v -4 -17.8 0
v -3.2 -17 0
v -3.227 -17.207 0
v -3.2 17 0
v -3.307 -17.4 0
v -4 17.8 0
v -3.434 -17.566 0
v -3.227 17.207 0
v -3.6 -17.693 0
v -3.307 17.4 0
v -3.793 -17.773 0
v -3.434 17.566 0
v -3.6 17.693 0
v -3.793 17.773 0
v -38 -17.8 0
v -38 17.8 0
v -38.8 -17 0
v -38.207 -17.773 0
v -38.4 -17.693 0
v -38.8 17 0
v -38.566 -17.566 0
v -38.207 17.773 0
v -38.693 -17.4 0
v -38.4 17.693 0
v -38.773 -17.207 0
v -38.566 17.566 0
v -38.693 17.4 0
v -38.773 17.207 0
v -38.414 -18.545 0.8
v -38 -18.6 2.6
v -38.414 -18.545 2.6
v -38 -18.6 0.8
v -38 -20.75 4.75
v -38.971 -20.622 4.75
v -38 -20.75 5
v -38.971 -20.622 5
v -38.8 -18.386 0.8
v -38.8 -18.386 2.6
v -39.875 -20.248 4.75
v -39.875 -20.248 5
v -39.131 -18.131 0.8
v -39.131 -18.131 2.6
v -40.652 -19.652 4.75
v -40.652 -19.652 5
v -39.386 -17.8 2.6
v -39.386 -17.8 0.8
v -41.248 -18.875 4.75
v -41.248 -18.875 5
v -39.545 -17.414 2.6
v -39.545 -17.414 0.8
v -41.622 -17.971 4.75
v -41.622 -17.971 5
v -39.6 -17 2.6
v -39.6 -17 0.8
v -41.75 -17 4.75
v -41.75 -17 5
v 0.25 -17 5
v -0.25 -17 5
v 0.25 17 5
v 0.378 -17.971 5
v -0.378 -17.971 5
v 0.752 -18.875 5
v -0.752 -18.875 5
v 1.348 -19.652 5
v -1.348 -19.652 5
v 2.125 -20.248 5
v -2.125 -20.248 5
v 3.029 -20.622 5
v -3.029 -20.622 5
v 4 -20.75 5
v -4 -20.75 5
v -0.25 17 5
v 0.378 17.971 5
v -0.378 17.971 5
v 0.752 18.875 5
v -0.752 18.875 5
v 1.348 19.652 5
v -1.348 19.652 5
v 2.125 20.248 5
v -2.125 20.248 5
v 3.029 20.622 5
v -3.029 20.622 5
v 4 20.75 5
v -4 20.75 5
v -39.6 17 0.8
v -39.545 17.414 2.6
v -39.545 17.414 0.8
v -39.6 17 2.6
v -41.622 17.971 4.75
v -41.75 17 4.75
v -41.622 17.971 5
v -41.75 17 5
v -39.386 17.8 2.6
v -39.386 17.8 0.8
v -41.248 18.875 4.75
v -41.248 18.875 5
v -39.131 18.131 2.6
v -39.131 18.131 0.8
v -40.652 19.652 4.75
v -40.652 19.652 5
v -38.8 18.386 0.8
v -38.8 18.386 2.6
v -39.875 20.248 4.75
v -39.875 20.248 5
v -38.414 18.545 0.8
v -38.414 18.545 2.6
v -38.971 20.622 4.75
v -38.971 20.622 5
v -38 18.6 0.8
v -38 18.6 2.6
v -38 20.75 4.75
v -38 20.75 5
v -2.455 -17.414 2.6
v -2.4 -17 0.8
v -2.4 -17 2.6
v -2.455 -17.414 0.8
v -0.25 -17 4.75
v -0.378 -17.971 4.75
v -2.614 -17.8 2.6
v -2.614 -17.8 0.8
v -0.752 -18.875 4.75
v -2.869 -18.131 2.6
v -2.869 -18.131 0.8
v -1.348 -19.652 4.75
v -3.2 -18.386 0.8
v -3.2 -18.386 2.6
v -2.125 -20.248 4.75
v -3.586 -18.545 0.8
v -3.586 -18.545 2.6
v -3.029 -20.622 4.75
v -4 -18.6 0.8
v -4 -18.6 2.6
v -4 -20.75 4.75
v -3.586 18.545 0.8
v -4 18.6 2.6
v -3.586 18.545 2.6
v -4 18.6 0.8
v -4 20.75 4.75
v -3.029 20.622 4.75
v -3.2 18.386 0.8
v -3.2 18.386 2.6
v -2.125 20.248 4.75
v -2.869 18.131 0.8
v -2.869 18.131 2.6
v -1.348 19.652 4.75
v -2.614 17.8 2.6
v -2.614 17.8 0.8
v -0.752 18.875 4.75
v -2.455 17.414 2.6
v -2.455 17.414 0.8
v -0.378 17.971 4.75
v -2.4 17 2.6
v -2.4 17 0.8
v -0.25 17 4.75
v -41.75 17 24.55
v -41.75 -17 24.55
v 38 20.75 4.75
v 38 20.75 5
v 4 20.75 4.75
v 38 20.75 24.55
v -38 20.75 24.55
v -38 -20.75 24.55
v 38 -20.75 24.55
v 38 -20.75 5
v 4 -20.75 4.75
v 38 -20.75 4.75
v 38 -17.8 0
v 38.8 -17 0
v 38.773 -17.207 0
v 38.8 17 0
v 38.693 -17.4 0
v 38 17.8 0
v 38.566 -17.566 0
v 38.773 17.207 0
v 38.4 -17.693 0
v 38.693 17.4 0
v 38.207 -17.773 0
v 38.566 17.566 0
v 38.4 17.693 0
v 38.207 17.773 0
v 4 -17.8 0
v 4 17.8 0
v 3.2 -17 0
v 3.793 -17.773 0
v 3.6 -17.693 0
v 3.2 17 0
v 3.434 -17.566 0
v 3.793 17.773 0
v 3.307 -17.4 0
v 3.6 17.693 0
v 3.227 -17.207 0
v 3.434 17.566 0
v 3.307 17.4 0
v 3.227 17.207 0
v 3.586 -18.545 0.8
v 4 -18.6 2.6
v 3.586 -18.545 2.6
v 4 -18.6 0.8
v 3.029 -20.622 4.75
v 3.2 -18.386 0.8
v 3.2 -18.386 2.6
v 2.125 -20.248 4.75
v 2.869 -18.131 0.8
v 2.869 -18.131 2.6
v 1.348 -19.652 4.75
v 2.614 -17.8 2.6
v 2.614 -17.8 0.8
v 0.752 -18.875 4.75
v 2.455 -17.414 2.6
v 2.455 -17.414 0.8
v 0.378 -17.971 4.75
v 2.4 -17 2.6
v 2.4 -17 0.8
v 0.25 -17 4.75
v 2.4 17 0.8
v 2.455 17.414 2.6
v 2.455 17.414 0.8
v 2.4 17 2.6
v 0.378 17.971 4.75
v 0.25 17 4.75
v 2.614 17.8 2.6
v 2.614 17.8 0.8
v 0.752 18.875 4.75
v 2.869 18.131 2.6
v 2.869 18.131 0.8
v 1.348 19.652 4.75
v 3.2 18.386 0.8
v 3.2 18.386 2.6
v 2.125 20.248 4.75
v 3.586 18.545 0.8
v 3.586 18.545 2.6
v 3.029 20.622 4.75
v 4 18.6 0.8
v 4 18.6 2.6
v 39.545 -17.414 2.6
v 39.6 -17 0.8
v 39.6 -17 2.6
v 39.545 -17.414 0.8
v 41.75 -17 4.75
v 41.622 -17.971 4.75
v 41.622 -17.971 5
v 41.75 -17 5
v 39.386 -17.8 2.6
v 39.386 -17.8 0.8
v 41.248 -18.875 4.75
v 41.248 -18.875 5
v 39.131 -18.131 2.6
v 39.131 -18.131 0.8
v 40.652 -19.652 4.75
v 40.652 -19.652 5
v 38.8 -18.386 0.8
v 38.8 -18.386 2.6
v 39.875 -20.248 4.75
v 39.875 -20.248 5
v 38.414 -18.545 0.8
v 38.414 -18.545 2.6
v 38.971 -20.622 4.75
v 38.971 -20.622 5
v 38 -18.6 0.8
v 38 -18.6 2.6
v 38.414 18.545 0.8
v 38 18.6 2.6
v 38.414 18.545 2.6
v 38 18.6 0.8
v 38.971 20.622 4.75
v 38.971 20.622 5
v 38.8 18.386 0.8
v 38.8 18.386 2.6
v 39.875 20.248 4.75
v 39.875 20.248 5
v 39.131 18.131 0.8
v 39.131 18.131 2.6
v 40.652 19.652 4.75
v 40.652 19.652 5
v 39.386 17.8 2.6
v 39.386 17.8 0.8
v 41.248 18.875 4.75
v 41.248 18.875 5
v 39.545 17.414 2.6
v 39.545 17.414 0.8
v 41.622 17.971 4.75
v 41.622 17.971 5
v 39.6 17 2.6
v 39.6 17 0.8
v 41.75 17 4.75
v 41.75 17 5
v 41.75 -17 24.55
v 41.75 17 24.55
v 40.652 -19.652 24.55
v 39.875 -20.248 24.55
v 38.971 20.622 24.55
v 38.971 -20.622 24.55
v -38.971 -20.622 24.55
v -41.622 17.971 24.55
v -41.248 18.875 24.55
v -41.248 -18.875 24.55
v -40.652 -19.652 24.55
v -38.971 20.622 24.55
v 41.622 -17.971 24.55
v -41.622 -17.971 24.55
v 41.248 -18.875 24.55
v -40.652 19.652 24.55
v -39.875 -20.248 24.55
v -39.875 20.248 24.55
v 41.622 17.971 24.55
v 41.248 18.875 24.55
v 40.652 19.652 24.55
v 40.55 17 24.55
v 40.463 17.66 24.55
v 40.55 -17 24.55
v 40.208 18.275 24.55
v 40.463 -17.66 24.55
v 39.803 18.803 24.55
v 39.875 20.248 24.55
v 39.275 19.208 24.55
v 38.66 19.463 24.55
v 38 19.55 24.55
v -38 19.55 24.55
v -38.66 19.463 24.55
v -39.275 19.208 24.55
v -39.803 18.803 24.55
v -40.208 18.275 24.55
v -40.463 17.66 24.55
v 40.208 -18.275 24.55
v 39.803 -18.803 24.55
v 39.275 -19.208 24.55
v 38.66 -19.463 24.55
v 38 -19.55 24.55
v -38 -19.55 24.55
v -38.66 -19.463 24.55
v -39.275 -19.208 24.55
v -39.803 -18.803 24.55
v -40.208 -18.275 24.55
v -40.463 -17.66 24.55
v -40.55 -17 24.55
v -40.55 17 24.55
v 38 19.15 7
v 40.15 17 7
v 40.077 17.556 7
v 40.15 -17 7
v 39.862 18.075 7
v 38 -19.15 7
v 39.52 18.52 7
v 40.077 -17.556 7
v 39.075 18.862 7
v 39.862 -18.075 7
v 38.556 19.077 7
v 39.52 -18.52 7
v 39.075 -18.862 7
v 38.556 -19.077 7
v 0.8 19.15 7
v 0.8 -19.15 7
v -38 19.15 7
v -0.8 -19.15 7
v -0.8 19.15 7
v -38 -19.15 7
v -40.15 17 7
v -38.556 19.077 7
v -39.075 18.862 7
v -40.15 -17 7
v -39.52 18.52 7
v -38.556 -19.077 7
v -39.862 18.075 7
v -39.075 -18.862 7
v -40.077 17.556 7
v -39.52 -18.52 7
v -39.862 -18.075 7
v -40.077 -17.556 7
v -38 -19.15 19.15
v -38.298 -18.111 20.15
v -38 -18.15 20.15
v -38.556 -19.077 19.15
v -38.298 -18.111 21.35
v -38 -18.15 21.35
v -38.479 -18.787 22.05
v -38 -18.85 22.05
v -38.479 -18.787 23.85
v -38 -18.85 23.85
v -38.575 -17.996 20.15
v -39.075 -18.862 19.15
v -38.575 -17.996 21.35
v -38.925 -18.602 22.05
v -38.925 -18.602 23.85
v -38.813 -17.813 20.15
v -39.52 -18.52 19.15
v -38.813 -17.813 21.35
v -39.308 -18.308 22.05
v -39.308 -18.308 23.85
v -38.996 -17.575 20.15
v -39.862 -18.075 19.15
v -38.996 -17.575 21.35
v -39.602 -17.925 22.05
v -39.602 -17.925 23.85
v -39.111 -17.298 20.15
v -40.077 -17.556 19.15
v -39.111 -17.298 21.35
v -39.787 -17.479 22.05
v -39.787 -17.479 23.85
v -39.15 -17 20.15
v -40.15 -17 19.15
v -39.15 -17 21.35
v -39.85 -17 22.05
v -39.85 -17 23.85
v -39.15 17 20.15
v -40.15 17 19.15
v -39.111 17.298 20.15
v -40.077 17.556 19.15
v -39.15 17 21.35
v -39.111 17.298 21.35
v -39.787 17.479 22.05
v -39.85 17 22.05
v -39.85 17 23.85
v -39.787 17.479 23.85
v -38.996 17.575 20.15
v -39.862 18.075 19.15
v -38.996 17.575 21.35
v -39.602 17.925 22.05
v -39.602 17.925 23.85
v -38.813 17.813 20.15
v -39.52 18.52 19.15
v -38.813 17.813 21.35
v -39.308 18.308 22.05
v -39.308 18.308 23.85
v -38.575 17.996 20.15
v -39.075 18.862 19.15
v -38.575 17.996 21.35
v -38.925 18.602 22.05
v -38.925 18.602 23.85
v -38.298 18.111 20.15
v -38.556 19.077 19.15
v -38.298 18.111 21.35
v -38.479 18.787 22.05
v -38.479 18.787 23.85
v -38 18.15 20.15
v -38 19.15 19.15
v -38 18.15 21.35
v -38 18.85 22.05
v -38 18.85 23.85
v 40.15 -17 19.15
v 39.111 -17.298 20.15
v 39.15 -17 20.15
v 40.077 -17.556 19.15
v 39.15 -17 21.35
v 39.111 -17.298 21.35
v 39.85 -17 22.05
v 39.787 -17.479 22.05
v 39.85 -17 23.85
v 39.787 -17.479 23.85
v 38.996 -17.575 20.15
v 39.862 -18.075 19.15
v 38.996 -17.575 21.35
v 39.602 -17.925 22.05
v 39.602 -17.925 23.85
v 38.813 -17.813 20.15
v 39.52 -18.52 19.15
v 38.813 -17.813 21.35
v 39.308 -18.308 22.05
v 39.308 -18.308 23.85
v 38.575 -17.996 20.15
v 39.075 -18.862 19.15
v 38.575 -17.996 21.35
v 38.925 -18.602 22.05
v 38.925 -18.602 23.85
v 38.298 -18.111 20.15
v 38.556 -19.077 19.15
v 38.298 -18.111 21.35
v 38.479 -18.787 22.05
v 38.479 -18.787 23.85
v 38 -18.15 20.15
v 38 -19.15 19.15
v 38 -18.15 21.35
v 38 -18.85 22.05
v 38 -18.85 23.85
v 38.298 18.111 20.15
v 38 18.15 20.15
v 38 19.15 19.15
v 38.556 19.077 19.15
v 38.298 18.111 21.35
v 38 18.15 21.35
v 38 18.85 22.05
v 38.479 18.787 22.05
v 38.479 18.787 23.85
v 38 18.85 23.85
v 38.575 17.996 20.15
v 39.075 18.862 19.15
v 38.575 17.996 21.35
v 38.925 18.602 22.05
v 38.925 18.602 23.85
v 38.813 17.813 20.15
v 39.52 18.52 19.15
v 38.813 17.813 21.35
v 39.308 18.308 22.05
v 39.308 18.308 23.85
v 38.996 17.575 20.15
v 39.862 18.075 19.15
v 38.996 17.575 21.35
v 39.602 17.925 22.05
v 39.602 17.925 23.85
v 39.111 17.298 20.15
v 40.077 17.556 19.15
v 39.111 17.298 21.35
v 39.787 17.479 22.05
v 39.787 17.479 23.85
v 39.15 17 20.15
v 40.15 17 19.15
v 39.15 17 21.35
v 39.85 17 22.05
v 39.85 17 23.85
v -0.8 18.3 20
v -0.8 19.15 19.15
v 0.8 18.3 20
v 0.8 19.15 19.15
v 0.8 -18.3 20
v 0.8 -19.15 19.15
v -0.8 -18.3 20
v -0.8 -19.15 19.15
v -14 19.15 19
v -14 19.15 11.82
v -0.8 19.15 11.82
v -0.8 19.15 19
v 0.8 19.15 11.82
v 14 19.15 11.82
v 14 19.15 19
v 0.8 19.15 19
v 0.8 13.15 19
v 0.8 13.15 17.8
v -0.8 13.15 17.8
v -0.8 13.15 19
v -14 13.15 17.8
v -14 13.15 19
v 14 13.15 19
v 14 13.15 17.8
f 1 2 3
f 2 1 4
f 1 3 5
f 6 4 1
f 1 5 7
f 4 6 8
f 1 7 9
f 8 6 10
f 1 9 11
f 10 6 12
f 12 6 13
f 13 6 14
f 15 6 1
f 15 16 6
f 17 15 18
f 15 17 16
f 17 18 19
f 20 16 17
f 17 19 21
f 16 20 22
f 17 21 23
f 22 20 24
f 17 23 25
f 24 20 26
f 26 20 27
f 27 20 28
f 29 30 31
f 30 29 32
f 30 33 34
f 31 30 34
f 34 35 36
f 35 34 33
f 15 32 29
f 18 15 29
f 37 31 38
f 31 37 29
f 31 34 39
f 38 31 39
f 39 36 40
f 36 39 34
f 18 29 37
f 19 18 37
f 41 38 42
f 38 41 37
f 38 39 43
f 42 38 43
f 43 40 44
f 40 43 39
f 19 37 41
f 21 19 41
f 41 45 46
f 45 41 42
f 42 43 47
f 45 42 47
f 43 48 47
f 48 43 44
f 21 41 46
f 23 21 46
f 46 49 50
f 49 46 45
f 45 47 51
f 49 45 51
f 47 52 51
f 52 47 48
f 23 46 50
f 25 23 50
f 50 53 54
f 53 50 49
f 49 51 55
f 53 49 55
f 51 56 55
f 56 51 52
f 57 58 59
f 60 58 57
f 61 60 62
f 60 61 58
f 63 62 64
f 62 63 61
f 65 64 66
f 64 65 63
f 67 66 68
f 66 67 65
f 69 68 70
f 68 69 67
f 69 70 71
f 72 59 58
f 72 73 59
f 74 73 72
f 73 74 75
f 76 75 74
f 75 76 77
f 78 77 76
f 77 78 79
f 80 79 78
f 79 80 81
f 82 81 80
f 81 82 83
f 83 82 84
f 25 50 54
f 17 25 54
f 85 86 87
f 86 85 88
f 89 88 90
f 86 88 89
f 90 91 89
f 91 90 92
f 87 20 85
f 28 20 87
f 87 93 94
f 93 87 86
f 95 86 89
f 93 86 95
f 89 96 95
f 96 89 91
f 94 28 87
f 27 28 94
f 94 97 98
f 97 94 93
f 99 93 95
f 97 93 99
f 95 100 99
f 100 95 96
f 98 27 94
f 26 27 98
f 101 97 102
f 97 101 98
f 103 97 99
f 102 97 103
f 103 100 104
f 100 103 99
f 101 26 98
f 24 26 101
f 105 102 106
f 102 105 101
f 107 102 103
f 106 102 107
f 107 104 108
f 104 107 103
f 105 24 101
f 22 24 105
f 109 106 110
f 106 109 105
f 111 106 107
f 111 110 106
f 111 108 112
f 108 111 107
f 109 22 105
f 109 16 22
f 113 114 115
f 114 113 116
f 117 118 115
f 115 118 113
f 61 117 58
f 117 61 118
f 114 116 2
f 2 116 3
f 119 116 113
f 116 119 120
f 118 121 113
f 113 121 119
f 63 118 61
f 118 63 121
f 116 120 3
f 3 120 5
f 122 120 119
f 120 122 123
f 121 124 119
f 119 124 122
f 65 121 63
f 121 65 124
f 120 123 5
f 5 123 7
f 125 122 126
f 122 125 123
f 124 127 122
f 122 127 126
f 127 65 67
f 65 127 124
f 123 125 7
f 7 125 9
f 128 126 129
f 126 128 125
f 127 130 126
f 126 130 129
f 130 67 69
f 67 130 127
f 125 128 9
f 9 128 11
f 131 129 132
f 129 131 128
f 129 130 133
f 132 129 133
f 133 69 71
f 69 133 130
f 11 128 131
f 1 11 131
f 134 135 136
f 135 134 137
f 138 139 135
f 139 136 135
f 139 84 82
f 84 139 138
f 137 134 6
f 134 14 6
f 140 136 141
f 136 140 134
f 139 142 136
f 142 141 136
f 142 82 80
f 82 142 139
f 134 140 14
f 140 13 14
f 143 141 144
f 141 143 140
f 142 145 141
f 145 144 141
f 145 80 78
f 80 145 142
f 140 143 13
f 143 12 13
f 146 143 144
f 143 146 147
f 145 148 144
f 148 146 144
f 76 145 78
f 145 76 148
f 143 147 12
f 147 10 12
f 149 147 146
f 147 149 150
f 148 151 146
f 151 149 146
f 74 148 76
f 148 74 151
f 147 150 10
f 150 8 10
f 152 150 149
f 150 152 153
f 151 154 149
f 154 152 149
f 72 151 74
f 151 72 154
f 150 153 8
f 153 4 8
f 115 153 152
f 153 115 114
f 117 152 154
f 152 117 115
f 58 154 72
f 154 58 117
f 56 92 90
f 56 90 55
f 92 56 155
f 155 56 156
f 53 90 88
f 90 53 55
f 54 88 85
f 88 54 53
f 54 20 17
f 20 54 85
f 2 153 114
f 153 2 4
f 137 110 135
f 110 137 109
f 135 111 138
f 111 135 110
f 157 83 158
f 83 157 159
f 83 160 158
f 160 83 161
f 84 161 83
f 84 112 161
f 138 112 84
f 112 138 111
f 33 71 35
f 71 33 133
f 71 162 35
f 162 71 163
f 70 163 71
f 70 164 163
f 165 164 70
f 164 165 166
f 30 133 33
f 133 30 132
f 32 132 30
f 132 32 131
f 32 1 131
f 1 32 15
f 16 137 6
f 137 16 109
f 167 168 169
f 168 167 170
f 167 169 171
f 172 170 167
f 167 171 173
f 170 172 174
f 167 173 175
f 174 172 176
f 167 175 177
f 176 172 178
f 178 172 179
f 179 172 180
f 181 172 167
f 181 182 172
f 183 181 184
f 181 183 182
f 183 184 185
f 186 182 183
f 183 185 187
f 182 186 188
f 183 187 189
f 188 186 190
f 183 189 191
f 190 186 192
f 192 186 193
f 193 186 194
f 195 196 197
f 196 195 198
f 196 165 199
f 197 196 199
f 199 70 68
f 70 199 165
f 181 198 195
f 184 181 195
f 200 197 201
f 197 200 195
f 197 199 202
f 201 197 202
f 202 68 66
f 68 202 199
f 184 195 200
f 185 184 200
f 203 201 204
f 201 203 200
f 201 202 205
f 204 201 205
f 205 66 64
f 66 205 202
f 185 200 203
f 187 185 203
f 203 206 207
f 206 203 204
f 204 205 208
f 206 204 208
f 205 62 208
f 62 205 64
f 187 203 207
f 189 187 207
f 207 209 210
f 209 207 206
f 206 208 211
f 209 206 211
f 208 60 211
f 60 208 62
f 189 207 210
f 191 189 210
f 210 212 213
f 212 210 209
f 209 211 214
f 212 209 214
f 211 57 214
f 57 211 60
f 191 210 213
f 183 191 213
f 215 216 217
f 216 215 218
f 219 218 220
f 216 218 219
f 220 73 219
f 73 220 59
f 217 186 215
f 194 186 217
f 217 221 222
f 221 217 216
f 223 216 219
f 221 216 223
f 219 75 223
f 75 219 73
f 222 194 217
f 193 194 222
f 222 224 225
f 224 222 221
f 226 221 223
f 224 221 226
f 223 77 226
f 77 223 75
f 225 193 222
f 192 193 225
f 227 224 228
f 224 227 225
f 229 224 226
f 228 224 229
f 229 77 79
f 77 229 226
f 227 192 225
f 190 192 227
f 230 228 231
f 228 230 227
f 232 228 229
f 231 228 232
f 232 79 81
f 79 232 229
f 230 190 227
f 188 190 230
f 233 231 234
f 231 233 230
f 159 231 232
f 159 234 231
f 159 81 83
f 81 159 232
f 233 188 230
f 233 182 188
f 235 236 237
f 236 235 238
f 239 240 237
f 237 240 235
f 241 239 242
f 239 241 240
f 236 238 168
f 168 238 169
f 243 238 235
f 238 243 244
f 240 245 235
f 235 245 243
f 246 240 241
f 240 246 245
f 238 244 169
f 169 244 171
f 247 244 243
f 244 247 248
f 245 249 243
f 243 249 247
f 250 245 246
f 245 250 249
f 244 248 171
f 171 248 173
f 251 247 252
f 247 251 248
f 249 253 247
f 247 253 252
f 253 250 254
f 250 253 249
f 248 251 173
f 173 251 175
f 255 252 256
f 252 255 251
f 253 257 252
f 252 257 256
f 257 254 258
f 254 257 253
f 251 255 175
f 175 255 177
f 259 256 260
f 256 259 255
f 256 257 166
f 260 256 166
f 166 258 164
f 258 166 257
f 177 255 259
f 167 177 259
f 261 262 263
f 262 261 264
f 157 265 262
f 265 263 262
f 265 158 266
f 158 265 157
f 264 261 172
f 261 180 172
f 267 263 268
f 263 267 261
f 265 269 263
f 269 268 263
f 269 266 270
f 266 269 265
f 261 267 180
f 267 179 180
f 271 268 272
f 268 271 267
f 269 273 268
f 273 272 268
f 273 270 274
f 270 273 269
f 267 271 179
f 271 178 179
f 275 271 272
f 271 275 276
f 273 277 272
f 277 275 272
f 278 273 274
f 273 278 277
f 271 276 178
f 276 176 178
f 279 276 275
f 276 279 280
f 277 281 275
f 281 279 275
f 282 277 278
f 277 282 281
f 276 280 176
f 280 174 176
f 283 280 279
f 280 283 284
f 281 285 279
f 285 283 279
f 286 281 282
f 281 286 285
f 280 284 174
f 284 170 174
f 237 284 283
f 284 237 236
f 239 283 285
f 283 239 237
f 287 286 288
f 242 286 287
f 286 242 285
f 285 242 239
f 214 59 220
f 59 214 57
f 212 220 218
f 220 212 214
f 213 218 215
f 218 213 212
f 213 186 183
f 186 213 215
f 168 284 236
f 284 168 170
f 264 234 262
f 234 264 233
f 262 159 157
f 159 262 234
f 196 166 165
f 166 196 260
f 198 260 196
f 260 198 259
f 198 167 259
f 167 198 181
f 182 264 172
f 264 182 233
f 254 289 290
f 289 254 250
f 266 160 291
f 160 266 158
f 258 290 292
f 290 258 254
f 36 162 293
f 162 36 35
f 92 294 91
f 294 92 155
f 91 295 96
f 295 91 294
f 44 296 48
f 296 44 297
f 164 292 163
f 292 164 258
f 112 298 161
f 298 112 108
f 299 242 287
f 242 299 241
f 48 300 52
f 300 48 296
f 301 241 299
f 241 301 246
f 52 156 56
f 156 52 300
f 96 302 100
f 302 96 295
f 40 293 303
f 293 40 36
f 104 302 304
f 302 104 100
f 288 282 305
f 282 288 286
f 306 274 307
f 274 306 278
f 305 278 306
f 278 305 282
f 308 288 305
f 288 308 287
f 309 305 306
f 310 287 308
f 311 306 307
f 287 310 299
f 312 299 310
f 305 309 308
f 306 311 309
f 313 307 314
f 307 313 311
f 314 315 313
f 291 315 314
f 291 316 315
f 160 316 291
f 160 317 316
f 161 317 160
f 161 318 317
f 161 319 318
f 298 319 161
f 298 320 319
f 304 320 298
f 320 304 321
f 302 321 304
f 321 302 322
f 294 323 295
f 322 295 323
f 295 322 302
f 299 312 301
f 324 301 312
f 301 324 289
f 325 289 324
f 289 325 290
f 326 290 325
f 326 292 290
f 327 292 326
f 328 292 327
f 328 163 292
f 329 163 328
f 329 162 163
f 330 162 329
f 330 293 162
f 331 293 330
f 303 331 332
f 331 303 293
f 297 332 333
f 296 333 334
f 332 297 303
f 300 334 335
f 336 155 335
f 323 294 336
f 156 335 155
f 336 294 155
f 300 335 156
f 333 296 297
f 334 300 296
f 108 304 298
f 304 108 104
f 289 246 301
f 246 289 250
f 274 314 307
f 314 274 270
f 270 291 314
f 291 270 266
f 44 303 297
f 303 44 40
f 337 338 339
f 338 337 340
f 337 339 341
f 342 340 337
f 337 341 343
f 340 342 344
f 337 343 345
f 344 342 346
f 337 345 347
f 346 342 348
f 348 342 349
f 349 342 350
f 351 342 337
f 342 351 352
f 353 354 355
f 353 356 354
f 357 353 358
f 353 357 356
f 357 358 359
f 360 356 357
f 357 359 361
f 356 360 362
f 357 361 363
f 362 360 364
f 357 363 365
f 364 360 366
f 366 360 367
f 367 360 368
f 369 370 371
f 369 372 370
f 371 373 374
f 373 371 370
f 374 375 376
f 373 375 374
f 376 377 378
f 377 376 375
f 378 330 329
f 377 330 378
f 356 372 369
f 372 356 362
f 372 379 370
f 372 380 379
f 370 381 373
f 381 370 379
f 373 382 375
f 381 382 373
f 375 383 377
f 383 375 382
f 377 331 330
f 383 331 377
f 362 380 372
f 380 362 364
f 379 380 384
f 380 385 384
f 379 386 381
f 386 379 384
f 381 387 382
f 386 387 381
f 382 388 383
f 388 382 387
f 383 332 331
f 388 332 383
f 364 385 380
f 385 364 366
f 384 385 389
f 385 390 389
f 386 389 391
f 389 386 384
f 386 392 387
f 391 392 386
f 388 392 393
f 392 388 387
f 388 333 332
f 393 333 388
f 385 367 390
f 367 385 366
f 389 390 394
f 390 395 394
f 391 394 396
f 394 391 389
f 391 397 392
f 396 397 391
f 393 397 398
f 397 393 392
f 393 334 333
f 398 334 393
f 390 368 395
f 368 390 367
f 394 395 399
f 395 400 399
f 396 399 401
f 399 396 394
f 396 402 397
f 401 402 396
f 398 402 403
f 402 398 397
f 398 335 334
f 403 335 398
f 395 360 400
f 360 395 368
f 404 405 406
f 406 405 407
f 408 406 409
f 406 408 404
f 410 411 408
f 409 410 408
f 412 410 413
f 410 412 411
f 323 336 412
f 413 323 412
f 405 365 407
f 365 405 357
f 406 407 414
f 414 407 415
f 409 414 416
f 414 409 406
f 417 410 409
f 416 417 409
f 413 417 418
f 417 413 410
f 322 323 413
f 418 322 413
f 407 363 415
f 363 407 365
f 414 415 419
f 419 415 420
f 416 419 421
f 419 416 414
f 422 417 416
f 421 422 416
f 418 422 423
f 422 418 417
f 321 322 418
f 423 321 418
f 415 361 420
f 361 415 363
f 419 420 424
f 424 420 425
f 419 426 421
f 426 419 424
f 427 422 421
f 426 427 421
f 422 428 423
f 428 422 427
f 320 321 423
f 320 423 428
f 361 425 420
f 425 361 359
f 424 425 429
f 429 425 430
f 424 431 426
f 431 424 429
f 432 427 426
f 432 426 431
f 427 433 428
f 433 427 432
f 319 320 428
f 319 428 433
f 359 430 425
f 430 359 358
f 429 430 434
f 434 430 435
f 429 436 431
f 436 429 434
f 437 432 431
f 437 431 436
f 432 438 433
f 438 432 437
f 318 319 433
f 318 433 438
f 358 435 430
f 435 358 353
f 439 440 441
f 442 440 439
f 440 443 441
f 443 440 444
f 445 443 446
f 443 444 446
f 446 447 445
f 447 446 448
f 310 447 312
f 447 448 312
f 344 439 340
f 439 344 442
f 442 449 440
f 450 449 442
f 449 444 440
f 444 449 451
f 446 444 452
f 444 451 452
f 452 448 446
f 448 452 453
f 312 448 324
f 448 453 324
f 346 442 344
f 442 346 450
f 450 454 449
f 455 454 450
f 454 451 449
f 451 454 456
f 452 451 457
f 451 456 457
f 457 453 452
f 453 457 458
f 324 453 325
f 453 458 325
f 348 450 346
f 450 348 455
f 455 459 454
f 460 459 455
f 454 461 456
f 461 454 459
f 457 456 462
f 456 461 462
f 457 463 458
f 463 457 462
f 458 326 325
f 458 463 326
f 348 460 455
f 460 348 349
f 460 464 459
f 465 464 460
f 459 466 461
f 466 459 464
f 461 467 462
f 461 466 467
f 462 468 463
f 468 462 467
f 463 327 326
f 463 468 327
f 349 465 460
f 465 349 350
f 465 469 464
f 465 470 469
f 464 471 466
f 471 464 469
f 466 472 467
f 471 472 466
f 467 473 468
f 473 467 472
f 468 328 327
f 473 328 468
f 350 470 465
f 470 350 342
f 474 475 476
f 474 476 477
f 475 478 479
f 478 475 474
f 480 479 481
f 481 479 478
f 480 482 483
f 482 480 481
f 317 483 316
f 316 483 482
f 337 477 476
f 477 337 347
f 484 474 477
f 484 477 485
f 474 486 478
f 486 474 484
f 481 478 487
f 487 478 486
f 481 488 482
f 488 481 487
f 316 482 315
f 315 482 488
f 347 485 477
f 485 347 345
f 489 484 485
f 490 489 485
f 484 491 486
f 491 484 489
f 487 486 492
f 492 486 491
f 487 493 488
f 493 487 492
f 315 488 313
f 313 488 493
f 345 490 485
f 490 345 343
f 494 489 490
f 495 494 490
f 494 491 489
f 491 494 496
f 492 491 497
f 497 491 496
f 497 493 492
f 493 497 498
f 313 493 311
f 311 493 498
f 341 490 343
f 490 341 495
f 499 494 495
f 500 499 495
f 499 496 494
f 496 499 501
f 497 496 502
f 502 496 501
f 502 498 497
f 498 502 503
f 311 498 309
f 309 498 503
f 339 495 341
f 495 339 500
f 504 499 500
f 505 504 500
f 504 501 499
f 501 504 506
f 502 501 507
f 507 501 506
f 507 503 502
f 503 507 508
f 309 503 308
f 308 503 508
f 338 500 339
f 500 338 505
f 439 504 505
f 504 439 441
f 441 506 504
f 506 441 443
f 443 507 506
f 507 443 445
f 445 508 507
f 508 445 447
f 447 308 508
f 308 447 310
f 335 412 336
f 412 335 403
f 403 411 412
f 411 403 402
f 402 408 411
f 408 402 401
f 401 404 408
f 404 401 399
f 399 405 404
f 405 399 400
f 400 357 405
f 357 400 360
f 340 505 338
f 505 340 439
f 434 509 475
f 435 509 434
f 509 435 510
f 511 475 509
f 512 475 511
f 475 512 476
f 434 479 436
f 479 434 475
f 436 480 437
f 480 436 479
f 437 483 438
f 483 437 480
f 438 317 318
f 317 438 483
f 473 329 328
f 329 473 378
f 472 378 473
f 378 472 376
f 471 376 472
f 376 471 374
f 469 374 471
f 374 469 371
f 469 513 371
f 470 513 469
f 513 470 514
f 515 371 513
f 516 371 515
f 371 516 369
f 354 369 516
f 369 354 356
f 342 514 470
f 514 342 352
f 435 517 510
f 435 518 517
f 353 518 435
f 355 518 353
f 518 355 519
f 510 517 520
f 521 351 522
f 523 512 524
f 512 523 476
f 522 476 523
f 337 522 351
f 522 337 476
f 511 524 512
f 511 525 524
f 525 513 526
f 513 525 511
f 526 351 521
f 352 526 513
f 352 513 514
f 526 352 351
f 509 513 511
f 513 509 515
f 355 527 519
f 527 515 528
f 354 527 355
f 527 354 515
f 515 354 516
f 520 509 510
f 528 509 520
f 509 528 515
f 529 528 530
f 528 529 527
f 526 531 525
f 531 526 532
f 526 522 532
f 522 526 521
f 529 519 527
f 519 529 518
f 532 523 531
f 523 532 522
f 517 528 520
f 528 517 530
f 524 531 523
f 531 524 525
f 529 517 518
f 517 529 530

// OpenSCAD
// Gridfinity divided storage bin; print feet down, opening up. Millimetres.
// The 45-degree feet and label support print without support material.
// Glue optional 6 x 2 mm magnets into the underside; M3 holes are unthreaded.
grid_x = 2; // Width in 42 mm grid units [1:1:4]
grid_y = 1; // Depth in 42 mm grid units [1:1:4]
height_units = 3; // Body height including feet, in 7 mm units [2:1:8]
wall = 1.6; // Body wall and divider thickness, mm [1.2:0.2:2.4]
stacking_lip = true; // Add a mating lip with a sturdy, shortened lead-in
x_dividers = 1; // Walls dividing the width; zero leaves it undivided [0:1:5]
y_dividers = 0; // Walls dividing the depth; zero leaves it undivided [0:1:5]
label_tab = true; // Add a flat label shelf on the rear inside wall
label_width = 28; // Label shelf width, mm; limited to the bin width [16:1:50]
label_depth = 6; // Label shelf projection, mm; shortened for shallow bins [4:1:8]
magnet_holes = false; // Add four magnet pockets beneath every grid cell
screw_holes = false; // Add coaxial blind 3 mm M3 holes, 5 mm deep
magnet_clearance = 0.4; // Added to 6 mm magnet diameter for glue fit, mm [0.2:0.1:0.4]
magnet_depth = 2.2; // Pocket depth for 2 mm thick magnets, mm [2:0.1:2.4]

// Original dimensional references (implementation written for this example):
// https://gridfinity.xyz/specification/
// https://kennetek.github.io/gridfinity-rebuilt-openscad/constants/
// https://github.com/kennetek/gridfinity-rebuilt-openscad/blob/main/src/core/standard.scad
// Foot: 35.6 -> 37.2 -> 41.5 mm; 0.8/1.8/2.15 mm high stages.
// Body footprint = 42*N - 0.5. The floor is at Z=7, leaving 2 mm
// above the joining slab at Z=5. Short bridges join adjacent rounded feet
// (0.5 mm between straight edges, up to 8 mm around corner junctions).
// Lip follows the 0.7/1.8/1.9 mm nominal profile, with its upper 1.2 mm
// omitted, leaving a 1.2 mm rim. Raise the female profile datum 0.35 mm
// relative to the body height so the foot seats at exactly 7*height_units.
// Overall height with this shortened lead-in is 7*height_units + 3.55 mm.
/* [Hidden] */
eps = 0.02;
width = grid_x*42-0.5;
depth = grid_y*42-0.5;
body_h = height_units*7;
inside_r = 3.75-wall;
lip_h = stacking_lip ? 3.55 : 0;
lip_z = body_h+0.35;
assert(grid_x>=1 && grid_y>=1 && grid_x==floor(grid_x) && grid_y==floor(grid_y),
    "Grid counts must be positive integers");
assert(height_units>=2 && height_units==floor(height_units),"Use at least two height units");
assert(wall>=1.2 && wall<=2.4,"Wall must be 1.2 to 2.4 mm");
assert(x_dividers>=0 && y_dividers>=0 && x_dividers==floor(x_dividers)
    && y_dividers==floor(y_dividers),"Divider counts must be nonnegative integers");
assert((width-2*wall-x_dividers*wall)/(x_dividers+1)>=4
    && (depth-2*wall-y_dividers*wall)/(y_dividers+1)>=4,
    "Leave at least 4 mm inside each compartment");

module cavity() {
    if (stacking_lip)
        // An inward 45-degree transition below the lip avoids a flat overhang.
        rounded_profile(width/2-3.75,depth/2-3.75,
            [[inside_r,7],[inside_r,lip_z-1.2-(inside_r-1.15)],
             [1.15,lip_z-1.2],[1.15,lip_z],[1.85,lip_z+0.7],
             [1.85,lip_z+2.5],[2.55,lip_z+3.2],[2.55,lip_z+3.2+eps]]);
    else translate([0,0,7]) linear_extrude(height=body_h-7+eps)
        rounded_outline(width-2*wall,depth-2*wall,inside_r);
}

module label_shelf() {
    tw = min(label_width,width-2*wall-4);
    // Shorten the shelf in shallow bins so its support stays above the floor.
    td = min(label_depth,body_h-10.2);
    // Local X becomes Y, Y becomes Z and the extrusion runs along X.
    translate([-tw/2,depth/2-wall,body_h-2]) rotate([90,0,90])
        linear_extrude(height=tw)
            polygon([[eps,0],[-td,0],[-td,-1.2],[eps,-td-1.2]]);
}

module gridfinity_bin() {
    difference() {
        union() {
            difference() {
                union() {
                    feet();
                    translate([0,0,5]) linear_extrude(height=body_h+lip_h-5)
                        rounded_outline(width,depth,3.75);
                }
                cavity();
            }
            // Dividers meet the floor and stop below the stacking interface.
            if (x_dividers>0) for (i=[1:x_dividers])
                translate([-width/2+wall+i*(width-2*wall)/(x_dividers+1)-wall/2,
                    -depth/2+wall-eps,7-eps])
                    cube([wall,depth-2*wall+2*eps,body_h-8+eps]);
            if (y_dividers>0) for (i=[1:y_dividers])
                translate([-width/2+wall-eps,
                    -depth/2+wall+i*(depth-2*wall)/(y_dividers+1)-wall/2,7-eps])
                    cube([width-2*wall+2*eps,wall,body_h-8+eps]);
            if (label_tab) label_shelf();
        }
        fastener_holes();
    }
}

// Fill a rounded rectangle from radius/height stations. Corner centres stay
// fixed: changing radius by the same amount as Z makes a true 45-degree slope.
// Two extruded sections and four turned corners avoid hulls and external libs.
module rounded_profile(cx, cy, stations) {
    union() {
        rotate([90,0,0]) linear_extrude(height=2*cy, center=true)
            polygon(concat(
                [for (p=stations) [cx+p[0],p[1]]],
                [for (i=[len(stations)-1:-1:0])
                    [-cx-stations[i][0],stations[i][1]]]));
        rotate([90,0,90]) linear_extrude(height=2*cx, center=true)
            polygon(concat(
                [for (p=stations) [cy+p[0],p[1]]],
                [for (i=[len(stations)-1:-1:0])
                    [-cy-stations[i][0],stations[i][1]]]));
        for (x=[-cx,cx], y=[-cy,cy]) translate([x,y,0])
            rotate_extrude($fn=24)
                polygon(concat([[0,stations[0][1]]], stations,
                    [[0,stations[len(stations)-1][1]]]));
    }
}

// Six chords per quarter-circle: small files, with real rounded corners.
module rounded_outline(w, d, r) {
    polygon([for (q=[0:3], j=[0:6])
        let(a=q*90+j*15,
            x=(q==0 || q==3) ? w/2-r : -w/2+r,
            y=q<2 ? d/2-r : -d/2+r)
        [x+r*cos(a),y+r*sin(a)]]);
}

// A 0.25 mm vertical collar keeps the joining slab above the 5 mm socket
// ridges. The standard 4.75 mm stepped mating profile stays unchanged.
module feet() {
    for (ix=[0:grid_x-1], iy=[0:grid_y-1])
        translate([(ix-(grid_x-1)/2)*42,(iy-(grid_y-1)/2)*42,0])
            rounded_profile(17,17,
                [[0.8,0],[1.6,0.8],[1.6,2.6],[3.75,4.75],[3.75,5]]);
}

// Four positions per cell, +/-13 mm: 26 mm centre spacing in both axes.
module fastener_holes() {
    for (ix=[0:grid_x-1], iy=[0:grid_y-1], sx=[-1,1], sy=[-1,1])
        translate([(ix-(grid_x-1)/2)*42+sx*13,
                   (iy-(grid_y-1)/2)*42+sy*13,-eps]) {
            if (magnet_holes)
                cylinder(h=magnet_depth+eps,d=6+magnet_clearance,$fn=24);
            if (screw_holes)
                cylinder(h=5+eps,d=3,$fn=20);
        }
}

color("#55a9e8") gridfinity_bin();
